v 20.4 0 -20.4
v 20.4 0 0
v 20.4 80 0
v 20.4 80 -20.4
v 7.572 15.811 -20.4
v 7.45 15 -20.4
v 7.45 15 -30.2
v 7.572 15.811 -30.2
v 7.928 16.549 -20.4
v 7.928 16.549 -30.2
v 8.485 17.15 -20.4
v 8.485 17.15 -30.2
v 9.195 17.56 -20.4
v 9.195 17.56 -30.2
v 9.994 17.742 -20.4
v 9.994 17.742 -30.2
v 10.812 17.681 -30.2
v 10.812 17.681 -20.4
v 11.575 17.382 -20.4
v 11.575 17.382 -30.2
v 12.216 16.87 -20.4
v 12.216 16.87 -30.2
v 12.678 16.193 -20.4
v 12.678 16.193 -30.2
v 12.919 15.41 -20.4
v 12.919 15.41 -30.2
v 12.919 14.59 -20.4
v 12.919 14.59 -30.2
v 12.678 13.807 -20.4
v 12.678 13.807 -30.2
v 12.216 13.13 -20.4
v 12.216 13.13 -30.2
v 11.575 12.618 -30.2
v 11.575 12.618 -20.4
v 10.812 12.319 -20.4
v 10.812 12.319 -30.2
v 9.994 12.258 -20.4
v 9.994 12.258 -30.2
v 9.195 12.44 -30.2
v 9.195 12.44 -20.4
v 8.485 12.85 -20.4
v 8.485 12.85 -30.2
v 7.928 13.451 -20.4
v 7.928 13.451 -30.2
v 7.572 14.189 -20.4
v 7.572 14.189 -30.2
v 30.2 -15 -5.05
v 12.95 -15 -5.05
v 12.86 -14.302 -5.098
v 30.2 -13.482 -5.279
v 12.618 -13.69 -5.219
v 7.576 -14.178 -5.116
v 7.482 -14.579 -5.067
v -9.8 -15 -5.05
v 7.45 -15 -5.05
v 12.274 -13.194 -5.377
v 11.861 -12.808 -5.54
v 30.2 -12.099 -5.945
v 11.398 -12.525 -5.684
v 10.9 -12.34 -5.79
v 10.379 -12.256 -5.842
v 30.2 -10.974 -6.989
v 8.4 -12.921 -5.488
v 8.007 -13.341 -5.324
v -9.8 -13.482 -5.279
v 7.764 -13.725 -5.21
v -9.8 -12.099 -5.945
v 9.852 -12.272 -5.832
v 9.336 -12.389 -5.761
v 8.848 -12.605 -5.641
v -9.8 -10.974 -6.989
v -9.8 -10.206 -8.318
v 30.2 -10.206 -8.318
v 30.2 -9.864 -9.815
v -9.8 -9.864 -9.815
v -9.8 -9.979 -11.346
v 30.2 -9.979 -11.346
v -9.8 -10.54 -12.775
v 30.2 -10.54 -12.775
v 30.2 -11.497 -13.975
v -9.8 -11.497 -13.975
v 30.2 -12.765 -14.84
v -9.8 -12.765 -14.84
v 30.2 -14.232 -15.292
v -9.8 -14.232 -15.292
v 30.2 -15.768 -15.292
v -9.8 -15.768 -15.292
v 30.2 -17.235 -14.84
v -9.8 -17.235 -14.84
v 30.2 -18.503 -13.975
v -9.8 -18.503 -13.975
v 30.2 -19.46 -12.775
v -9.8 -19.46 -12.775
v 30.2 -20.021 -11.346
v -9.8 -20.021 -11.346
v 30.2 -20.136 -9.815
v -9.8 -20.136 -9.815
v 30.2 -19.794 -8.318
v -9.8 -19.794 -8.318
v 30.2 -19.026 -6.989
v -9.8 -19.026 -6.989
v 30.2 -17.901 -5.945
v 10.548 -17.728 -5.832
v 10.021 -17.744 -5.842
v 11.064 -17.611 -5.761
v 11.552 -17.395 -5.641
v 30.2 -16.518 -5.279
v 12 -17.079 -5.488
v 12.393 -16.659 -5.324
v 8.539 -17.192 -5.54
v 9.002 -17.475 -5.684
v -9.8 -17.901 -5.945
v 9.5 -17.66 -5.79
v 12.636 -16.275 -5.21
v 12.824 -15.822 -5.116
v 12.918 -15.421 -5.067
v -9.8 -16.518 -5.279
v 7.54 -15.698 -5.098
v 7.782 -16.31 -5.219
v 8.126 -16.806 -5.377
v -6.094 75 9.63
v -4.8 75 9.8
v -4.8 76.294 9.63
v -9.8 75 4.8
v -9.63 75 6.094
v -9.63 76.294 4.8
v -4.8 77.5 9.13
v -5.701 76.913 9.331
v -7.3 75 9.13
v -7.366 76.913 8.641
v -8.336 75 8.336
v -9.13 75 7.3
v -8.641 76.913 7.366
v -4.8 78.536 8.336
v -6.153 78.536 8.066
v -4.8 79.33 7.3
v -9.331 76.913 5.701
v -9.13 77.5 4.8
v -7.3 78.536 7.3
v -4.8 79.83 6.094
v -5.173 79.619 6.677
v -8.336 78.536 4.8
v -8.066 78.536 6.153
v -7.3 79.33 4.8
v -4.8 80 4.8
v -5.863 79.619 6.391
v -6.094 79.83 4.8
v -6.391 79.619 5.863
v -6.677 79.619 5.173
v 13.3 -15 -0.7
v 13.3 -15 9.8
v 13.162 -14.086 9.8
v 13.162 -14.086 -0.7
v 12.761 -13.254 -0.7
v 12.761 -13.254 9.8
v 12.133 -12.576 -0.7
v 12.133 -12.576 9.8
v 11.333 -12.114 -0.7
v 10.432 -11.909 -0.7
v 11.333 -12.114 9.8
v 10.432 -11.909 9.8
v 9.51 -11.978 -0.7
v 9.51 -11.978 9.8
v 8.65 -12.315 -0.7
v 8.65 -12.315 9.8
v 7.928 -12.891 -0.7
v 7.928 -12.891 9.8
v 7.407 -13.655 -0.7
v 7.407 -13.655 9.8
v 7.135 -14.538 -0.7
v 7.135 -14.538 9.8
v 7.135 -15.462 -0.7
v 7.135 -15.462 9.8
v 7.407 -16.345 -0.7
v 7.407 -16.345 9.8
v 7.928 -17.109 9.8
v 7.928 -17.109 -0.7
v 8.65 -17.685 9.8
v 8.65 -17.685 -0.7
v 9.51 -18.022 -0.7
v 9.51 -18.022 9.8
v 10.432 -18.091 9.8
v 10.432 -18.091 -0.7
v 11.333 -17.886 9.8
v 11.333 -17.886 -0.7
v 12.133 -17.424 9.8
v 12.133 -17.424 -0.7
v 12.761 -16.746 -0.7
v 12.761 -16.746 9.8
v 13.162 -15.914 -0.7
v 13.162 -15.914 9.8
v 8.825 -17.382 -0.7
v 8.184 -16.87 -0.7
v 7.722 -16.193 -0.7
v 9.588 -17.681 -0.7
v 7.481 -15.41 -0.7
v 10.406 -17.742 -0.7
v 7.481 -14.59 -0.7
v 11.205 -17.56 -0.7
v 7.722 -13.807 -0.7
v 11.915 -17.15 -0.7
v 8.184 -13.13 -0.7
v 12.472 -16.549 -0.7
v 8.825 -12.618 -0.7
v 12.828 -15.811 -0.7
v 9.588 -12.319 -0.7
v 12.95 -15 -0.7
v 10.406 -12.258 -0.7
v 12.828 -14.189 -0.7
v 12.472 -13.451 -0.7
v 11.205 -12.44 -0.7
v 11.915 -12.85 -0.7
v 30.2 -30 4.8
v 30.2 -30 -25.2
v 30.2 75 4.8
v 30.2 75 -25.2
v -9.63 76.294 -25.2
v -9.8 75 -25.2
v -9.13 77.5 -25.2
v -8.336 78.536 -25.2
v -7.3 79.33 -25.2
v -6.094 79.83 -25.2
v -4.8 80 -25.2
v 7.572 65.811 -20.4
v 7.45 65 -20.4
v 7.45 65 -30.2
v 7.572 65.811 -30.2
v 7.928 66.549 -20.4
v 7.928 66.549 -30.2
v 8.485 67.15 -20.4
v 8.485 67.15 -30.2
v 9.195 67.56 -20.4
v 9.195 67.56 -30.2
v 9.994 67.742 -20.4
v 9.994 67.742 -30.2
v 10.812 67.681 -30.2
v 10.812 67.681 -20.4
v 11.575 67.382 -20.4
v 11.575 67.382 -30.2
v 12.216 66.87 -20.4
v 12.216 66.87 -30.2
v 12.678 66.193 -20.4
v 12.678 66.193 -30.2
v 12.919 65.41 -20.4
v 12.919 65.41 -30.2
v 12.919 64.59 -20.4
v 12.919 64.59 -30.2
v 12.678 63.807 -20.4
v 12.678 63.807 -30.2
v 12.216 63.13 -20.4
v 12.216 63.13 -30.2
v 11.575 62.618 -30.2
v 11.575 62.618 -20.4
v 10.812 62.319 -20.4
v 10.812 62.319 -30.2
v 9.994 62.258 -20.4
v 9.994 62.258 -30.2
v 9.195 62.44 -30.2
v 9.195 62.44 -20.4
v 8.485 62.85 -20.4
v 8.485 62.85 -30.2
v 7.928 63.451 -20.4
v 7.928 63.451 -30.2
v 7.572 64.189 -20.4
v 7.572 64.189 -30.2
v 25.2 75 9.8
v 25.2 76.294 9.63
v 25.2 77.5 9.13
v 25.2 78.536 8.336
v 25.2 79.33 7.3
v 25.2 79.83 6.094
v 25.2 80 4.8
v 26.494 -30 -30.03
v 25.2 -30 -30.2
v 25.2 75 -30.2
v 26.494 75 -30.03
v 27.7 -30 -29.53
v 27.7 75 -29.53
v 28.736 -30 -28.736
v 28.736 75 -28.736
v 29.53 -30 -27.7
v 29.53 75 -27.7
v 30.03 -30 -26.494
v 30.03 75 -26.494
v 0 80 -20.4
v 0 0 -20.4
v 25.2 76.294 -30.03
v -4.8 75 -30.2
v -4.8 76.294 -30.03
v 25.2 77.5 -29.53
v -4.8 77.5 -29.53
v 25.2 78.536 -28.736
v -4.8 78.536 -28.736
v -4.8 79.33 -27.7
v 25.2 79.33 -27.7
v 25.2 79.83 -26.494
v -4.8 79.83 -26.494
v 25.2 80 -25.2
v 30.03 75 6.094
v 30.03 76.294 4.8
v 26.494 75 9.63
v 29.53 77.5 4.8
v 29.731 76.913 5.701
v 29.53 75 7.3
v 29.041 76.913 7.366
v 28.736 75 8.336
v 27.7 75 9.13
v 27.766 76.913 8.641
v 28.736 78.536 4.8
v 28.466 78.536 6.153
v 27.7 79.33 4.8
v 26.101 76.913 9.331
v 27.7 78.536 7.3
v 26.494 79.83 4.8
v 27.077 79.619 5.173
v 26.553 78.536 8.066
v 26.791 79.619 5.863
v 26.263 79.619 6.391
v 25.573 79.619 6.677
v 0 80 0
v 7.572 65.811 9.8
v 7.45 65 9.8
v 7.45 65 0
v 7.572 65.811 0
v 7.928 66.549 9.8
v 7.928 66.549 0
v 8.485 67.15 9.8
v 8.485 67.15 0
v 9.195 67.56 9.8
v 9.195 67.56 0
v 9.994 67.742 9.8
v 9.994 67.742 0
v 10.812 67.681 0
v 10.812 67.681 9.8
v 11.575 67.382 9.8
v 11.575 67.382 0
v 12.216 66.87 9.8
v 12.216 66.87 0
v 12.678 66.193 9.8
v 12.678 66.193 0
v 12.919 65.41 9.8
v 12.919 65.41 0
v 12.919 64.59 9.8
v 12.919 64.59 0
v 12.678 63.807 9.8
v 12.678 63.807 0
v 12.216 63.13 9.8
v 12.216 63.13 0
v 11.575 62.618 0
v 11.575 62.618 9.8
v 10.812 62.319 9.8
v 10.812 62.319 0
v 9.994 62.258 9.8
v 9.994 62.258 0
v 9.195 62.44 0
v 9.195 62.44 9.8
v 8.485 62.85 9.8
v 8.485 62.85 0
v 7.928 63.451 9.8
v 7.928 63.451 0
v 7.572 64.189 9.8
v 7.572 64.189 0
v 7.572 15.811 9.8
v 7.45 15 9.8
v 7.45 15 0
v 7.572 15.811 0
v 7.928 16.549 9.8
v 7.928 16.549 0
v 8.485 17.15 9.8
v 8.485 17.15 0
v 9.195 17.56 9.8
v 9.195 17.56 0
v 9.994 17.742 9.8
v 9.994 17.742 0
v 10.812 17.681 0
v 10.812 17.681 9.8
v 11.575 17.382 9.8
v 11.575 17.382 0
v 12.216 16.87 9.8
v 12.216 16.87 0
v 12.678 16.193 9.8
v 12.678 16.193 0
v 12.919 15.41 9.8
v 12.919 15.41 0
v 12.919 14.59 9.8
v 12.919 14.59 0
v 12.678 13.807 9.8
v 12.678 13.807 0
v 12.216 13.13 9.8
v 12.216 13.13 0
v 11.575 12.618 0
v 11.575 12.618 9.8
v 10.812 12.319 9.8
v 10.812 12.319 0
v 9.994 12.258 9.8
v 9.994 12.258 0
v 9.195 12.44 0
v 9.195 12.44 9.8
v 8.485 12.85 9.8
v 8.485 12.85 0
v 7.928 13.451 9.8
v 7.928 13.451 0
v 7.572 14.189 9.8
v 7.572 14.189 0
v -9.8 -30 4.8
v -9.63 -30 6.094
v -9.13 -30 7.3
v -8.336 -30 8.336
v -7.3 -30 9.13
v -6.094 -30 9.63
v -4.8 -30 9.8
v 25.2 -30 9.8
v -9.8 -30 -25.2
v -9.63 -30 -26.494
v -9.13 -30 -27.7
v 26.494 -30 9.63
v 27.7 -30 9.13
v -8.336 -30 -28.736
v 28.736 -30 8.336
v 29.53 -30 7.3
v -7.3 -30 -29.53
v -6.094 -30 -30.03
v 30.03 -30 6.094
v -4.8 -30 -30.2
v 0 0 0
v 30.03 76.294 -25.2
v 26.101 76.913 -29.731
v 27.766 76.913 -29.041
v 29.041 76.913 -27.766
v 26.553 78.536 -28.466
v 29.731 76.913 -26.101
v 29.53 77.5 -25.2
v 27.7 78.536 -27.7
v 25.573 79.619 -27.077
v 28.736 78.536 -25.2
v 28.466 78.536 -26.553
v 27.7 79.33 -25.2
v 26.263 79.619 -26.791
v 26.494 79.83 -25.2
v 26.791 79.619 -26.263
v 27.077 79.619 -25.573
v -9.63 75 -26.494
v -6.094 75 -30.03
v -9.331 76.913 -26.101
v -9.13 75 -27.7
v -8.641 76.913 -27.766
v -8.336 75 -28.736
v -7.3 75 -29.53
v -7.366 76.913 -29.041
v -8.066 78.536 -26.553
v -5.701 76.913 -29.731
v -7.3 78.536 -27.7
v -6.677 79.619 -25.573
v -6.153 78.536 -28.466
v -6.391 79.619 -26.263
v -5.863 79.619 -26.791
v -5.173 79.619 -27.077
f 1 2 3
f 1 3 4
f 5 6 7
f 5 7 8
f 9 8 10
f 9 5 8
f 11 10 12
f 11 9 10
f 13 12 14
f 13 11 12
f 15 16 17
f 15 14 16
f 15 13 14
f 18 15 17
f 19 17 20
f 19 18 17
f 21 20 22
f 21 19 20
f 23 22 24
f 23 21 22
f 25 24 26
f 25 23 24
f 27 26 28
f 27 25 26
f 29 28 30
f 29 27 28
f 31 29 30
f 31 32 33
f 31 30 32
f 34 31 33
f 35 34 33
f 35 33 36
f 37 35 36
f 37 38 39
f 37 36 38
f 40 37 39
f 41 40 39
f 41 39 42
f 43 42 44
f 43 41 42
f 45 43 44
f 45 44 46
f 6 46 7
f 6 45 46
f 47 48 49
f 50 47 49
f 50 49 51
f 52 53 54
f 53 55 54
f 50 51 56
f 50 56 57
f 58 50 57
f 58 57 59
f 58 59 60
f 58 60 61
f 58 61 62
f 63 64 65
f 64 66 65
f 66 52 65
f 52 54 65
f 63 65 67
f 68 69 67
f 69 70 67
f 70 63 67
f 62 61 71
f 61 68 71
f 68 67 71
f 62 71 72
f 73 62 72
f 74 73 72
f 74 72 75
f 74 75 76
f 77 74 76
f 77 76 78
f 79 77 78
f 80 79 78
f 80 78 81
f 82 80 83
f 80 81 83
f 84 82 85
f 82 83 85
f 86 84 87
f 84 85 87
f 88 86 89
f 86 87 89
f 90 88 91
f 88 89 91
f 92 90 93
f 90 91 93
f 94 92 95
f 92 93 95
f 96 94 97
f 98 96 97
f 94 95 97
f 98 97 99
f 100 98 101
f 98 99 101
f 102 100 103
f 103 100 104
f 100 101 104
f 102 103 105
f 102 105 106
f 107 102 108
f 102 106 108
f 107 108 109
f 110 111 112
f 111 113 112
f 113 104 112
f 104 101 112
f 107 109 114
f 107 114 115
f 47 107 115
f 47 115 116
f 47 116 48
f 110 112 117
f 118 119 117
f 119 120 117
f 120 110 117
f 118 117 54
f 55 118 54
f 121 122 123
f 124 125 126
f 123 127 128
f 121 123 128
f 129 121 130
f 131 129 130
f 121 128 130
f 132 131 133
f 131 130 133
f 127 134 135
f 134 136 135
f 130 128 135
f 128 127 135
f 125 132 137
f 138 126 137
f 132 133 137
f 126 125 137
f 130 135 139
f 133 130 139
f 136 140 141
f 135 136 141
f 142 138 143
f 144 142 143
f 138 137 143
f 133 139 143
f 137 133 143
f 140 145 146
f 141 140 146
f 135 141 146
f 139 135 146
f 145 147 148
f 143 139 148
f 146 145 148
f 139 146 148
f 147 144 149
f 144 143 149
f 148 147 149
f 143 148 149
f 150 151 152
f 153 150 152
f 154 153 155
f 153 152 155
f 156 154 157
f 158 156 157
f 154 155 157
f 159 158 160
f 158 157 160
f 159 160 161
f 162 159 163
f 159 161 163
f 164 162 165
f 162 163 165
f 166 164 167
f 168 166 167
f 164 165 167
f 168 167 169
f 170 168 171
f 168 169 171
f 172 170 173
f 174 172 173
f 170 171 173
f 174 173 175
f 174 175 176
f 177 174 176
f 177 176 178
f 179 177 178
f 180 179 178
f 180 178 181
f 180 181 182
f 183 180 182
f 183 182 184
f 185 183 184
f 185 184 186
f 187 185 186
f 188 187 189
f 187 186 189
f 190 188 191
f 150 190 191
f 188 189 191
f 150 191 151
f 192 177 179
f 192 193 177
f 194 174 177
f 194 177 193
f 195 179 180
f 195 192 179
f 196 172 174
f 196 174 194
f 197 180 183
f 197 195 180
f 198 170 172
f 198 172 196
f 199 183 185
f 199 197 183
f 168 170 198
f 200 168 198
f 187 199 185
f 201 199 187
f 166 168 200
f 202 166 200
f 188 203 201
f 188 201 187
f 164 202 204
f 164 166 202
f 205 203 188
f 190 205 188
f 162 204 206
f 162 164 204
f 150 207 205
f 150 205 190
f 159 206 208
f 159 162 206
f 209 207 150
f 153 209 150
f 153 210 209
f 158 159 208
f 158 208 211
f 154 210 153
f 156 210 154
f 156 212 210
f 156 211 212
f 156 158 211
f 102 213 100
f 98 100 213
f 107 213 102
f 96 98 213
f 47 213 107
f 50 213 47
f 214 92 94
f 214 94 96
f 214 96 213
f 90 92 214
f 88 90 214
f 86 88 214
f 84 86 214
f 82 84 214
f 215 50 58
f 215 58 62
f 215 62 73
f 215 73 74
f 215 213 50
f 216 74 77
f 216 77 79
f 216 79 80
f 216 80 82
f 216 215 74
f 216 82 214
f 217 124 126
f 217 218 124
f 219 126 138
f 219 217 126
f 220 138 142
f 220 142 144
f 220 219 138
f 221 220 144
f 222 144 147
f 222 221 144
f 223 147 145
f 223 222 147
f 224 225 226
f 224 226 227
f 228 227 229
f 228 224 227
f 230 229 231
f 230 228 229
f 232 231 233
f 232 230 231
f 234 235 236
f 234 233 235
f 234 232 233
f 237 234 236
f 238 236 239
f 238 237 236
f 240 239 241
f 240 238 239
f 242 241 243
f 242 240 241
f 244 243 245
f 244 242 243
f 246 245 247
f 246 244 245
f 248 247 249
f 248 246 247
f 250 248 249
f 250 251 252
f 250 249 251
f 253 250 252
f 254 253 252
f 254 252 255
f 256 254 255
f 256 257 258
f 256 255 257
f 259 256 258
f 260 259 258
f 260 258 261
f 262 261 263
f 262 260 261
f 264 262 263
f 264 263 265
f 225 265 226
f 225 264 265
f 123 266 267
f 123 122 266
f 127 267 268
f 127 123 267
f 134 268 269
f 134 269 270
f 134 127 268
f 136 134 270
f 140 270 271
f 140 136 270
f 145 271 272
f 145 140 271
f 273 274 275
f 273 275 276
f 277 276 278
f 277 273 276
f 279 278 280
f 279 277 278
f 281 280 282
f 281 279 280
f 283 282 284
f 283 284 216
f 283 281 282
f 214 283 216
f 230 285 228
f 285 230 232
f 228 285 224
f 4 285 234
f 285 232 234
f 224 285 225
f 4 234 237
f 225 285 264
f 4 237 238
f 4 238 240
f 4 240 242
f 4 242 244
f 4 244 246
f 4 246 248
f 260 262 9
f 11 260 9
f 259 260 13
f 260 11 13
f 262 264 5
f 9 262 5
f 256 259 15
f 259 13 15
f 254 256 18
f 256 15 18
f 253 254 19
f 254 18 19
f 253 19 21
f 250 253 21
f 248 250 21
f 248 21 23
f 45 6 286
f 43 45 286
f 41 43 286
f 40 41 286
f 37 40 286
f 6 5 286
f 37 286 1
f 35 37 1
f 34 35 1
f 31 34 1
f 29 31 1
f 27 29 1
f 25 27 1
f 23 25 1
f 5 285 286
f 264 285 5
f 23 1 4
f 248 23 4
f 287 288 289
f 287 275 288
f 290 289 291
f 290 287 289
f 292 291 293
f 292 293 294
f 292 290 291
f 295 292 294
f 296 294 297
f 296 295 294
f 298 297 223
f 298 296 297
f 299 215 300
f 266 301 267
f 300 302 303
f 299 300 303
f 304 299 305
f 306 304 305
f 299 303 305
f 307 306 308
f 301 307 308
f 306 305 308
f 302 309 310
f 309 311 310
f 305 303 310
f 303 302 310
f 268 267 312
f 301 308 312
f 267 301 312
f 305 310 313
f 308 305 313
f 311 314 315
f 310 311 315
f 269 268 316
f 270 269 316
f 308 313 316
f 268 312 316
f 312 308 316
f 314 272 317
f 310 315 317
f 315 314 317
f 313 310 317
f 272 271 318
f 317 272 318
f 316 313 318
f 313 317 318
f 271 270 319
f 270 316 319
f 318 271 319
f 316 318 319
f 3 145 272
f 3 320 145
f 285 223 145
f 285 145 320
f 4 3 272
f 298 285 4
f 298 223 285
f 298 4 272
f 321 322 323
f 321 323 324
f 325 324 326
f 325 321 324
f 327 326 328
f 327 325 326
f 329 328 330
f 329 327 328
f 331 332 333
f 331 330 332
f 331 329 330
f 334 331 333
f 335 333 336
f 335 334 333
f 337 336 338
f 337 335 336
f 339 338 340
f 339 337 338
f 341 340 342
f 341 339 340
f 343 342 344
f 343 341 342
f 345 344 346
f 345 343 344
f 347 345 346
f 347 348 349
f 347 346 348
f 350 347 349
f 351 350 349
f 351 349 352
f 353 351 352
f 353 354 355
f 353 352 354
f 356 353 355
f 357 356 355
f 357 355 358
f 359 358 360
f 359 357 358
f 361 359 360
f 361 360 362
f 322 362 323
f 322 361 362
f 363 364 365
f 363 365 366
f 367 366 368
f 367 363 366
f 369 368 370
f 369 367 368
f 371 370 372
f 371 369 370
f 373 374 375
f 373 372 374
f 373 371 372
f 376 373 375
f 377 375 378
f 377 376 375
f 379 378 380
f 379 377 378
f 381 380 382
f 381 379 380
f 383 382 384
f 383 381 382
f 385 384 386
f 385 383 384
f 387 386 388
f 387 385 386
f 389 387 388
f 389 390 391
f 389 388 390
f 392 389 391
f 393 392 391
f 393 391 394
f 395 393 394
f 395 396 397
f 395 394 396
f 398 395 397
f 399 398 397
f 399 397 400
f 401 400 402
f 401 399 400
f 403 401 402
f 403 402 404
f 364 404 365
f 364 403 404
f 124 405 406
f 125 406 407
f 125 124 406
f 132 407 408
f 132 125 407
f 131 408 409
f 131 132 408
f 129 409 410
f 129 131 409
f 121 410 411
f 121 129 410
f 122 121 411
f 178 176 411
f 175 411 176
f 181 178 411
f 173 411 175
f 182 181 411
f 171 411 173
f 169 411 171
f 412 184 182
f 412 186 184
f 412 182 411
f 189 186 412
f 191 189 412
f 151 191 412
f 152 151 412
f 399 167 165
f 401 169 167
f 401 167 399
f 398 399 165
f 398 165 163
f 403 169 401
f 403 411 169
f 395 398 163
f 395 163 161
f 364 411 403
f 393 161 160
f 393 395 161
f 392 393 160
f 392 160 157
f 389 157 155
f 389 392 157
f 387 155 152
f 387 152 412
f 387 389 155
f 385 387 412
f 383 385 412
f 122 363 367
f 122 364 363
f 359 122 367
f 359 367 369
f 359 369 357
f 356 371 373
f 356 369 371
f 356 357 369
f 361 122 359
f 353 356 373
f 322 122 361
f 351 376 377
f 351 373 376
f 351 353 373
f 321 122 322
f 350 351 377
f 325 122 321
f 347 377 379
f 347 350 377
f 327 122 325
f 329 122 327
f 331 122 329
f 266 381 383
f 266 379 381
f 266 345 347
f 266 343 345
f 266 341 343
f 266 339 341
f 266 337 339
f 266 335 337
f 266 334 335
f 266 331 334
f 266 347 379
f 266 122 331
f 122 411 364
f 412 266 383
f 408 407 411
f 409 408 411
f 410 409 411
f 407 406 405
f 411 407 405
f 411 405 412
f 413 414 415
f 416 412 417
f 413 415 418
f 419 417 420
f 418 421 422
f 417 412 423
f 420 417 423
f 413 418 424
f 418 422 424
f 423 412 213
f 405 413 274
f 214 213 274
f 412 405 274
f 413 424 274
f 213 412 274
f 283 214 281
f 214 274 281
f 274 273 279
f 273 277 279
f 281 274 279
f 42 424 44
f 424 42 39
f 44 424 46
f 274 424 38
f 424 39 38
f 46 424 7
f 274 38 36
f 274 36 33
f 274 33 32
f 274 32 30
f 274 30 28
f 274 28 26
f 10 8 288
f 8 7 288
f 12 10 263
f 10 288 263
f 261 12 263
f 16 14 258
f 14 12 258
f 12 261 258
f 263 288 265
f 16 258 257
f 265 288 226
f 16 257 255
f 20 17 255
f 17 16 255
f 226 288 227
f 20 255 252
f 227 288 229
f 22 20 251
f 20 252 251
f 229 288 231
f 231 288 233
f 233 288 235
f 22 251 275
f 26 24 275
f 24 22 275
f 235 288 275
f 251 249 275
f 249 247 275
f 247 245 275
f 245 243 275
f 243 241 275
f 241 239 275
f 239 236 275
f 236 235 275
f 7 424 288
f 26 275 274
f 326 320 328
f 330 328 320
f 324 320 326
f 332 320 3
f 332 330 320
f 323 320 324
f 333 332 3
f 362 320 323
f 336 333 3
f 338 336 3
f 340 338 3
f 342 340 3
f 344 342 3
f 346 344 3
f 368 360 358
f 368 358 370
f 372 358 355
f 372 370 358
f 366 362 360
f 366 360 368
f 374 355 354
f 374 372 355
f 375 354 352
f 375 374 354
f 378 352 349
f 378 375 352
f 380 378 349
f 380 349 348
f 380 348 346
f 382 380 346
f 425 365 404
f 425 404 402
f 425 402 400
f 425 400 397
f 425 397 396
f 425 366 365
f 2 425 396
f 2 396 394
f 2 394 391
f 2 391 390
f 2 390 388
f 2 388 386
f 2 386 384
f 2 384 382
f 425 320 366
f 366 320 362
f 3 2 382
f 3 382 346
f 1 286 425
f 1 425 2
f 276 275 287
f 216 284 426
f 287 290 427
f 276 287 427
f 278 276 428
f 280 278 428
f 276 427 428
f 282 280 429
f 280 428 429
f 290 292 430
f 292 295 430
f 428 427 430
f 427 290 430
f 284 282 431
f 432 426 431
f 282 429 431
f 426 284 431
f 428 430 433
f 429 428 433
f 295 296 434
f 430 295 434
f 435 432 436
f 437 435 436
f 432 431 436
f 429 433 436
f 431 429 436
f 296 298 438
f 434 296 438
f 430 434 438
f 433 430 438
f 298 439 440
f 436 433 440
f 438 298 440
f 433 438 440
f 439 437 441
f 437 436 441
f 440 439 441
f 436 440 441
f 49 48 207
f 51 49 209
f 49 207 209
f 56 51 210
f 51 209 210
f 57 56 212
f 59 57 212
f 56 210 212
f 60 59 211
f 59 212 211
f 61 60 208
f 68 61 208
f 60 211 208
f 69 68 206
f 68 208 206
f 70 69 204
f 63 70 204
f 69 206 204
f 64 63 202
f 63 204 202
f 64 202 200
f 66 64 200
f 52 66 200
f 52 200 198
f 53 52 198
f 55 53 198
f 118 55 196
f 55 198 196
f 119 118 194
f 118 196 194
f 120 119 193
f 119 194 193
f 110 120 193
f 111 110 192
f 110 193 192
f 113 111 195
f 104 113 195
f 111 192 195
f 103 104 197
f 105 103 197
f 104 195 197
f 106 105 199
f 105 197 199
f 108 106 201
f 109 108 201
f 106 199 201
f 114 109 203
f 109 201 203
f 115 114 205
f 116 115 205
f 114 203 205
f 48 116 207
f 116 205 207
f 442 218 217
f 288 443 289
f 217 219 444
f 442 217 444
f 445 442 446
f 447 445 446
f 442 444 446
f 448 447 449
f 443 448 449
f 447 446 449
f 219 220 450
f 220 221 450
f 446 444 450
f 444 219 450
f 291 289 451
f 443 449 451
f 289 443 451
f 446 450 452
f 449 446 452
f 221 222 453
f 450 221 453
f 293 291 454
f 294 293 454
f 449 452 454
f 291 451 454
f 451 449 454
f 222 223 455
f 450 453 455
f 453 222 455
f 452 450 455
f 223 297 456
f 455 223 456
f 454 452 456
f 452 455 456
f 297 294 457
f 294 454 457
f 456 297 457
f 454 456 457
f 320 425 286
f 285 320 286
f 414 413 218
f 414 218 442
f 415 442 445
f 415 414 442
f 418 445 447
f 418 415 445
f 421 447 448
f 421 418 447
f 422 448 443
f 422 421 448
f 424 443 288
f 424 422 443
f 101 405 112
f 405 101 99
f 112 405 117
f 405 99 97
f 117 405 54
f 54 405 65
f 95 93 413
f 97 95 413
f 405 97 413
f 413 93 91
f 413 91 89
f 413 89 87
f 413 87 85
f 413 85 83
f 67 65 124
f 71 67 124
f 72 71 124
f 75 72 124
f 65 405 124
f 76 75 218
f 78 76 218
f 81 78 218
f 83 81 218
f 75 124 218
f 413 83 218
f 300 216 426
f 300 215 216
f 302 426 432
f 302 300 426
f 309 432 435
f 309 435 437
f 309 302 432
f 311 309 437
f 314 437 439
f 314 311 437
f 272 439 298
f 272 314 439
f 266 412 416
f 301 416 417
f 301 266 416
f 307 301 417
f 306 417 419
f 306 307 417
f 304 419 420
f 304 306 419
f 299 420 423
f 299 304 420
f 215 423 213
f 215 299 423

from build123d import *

# Parameters (mm, degrees)
SKETCH1_W               = 40
SKETCH1_H               = 40
SKETCH1_W_2             = 20.4
SKETCH1_H_2             = 20.4
BOSS_EXTRUDE1_DEPTH     = 80
SKETCH1_2_W             = 40
SKETCH1_2_H             = 40
BOSS_EXTRUDE2_DEPTH     = 30
CUT_EXTRUDE1_DEPTH      = 91.68671347
CUT_EXTRUDE1_DEPTH_BACK = 91.68671347
SKETCH2_R               = 2.75
SKETCH3_R               = 5.15
CUT_EXTRUDE4_DEPTH      = 95.403601626
FILLET1_R               = 5
SKETCH4_R               = 3.1
CUT_EXTRUDE6_DEPTH      = 10.5
SKETCH4_3_R             = 2.75
CUT_EXTRUDE7_DEPTH      = 20
FILLET2_R               = 5


with BuildPart() as part:
    # Sketch1 → Boss-Extrude1 (new body)
    with BuildSketch(Plane(origin=(0, 0, 0), x_dir=(1, 0, 0), z_dir=(0, 1, 0))):
        with Locations((10.2, 10.2)):
            Rectangle(SKETCH1_W, SKETCH1_H)
        with Locations((10.2, 10.2)):
            Rectangle(SKETCH1_W_2, SKETCH1_H_2, mode=Mode.SUBTRACT)
    extrude(amount=BOSS_EXTRUDE1_DEPTH)

    # Sketch1<2> → Boss-Extrude2 (add)
    with BuildSketch(Plane(origin=(0, 0, 0), x_dir=(1, 0, 0), z_dir=(0, 1, 0))):
        with Locations((10.2, 10.2)):
            Rectangle(SKETCH1_2_W, SKETCH1_2_H)
    extrude(amount=-BOSS_EXTRUDE2_DEPTH)

    # Sketch2 → Cut-Extrude1 (cut, two sides: drawn at the far end of the back side and taken through both)
    with BuildSketch(Plane(origin=(0, 0, 0), x_dir=(-1, 0, 0), z_dir=(0, 0, -1)).offset(-CUT_EXTRUDE1_DEPTH_BACK)):
        with Locations((-10.2, 15)):
            Circle(SKETCH2_R)
        with Locations((-10.2, 65)):
            Circle(SKETCH2_R)
    extrude(amount=CUT_EXTRUDE1_DEPTH + CUT_EXTRUDE1_DEPTH_BACK, mode=Mode.SUBTRACT)

    # Sketch3 → Cut-Extrude4 (cut, through all)
    with BuildSketch(Plane.ZY.offset(9.8)):
        with Locations((-10.2, -15)):
            Circle(SKETCH3_R)
    extrude(amount=-CUT_EXTRUDE4_DEPTH, mode=Mode.SUBTRACT)

    # Fillet1
    fillet1_edges = [part.edges().sort_by_distance(p)[0] for p in [
        (-9.8, 25, -30.2),
        (-9.8, 25, 9.8),
        (30.2, 25, 9.8),
        (30.2, 25, -30.2),
    ]]
    fillet(fillet1_edges, radius=FILLET1_R)

    # Sketch4 → Cut-Extrude6 (cut)
    with BuildSketch(Plane.XY.offset(9.8)):
        with Locations((10.2, -15)):
            Circle(SKETCH4_R)
    extrude(amount=-CUT_EXTRUDE6_DEPTH, mode=Mode.SUBTRACT)

    # Sketch4<3> → Cut-Extrude7 (cut)
    with BuildSketch(Plane.XY.offset(9.8)):
        with Locations((10.2, -15)):
            Circle(SKETCH4_3_R)
    extrude(amount=-CUT_EXTRUDE7_DEPTH, mode=Mode.SUBTRACT)

    # Fillet2
    fillet2_edges = [part.edges().sort_by_distance(p)[0] for p in [
        (-8.335533906, 80, -28.735533906),
        (10.2, 80, -30.2),
        (28.735533906, 80, -28.735533906),
        (30.2, 80, -10.2),
        (28.735533906, 80, 8.335533906),
        (10.2, 80, 9.8),
        (-8.335533906, 80, 8.335533906),
        (-9.8, 80, -10.2),
    ]]
    fillet(fillet2_edges, radius=FILLET2_R)


solid = part.part
